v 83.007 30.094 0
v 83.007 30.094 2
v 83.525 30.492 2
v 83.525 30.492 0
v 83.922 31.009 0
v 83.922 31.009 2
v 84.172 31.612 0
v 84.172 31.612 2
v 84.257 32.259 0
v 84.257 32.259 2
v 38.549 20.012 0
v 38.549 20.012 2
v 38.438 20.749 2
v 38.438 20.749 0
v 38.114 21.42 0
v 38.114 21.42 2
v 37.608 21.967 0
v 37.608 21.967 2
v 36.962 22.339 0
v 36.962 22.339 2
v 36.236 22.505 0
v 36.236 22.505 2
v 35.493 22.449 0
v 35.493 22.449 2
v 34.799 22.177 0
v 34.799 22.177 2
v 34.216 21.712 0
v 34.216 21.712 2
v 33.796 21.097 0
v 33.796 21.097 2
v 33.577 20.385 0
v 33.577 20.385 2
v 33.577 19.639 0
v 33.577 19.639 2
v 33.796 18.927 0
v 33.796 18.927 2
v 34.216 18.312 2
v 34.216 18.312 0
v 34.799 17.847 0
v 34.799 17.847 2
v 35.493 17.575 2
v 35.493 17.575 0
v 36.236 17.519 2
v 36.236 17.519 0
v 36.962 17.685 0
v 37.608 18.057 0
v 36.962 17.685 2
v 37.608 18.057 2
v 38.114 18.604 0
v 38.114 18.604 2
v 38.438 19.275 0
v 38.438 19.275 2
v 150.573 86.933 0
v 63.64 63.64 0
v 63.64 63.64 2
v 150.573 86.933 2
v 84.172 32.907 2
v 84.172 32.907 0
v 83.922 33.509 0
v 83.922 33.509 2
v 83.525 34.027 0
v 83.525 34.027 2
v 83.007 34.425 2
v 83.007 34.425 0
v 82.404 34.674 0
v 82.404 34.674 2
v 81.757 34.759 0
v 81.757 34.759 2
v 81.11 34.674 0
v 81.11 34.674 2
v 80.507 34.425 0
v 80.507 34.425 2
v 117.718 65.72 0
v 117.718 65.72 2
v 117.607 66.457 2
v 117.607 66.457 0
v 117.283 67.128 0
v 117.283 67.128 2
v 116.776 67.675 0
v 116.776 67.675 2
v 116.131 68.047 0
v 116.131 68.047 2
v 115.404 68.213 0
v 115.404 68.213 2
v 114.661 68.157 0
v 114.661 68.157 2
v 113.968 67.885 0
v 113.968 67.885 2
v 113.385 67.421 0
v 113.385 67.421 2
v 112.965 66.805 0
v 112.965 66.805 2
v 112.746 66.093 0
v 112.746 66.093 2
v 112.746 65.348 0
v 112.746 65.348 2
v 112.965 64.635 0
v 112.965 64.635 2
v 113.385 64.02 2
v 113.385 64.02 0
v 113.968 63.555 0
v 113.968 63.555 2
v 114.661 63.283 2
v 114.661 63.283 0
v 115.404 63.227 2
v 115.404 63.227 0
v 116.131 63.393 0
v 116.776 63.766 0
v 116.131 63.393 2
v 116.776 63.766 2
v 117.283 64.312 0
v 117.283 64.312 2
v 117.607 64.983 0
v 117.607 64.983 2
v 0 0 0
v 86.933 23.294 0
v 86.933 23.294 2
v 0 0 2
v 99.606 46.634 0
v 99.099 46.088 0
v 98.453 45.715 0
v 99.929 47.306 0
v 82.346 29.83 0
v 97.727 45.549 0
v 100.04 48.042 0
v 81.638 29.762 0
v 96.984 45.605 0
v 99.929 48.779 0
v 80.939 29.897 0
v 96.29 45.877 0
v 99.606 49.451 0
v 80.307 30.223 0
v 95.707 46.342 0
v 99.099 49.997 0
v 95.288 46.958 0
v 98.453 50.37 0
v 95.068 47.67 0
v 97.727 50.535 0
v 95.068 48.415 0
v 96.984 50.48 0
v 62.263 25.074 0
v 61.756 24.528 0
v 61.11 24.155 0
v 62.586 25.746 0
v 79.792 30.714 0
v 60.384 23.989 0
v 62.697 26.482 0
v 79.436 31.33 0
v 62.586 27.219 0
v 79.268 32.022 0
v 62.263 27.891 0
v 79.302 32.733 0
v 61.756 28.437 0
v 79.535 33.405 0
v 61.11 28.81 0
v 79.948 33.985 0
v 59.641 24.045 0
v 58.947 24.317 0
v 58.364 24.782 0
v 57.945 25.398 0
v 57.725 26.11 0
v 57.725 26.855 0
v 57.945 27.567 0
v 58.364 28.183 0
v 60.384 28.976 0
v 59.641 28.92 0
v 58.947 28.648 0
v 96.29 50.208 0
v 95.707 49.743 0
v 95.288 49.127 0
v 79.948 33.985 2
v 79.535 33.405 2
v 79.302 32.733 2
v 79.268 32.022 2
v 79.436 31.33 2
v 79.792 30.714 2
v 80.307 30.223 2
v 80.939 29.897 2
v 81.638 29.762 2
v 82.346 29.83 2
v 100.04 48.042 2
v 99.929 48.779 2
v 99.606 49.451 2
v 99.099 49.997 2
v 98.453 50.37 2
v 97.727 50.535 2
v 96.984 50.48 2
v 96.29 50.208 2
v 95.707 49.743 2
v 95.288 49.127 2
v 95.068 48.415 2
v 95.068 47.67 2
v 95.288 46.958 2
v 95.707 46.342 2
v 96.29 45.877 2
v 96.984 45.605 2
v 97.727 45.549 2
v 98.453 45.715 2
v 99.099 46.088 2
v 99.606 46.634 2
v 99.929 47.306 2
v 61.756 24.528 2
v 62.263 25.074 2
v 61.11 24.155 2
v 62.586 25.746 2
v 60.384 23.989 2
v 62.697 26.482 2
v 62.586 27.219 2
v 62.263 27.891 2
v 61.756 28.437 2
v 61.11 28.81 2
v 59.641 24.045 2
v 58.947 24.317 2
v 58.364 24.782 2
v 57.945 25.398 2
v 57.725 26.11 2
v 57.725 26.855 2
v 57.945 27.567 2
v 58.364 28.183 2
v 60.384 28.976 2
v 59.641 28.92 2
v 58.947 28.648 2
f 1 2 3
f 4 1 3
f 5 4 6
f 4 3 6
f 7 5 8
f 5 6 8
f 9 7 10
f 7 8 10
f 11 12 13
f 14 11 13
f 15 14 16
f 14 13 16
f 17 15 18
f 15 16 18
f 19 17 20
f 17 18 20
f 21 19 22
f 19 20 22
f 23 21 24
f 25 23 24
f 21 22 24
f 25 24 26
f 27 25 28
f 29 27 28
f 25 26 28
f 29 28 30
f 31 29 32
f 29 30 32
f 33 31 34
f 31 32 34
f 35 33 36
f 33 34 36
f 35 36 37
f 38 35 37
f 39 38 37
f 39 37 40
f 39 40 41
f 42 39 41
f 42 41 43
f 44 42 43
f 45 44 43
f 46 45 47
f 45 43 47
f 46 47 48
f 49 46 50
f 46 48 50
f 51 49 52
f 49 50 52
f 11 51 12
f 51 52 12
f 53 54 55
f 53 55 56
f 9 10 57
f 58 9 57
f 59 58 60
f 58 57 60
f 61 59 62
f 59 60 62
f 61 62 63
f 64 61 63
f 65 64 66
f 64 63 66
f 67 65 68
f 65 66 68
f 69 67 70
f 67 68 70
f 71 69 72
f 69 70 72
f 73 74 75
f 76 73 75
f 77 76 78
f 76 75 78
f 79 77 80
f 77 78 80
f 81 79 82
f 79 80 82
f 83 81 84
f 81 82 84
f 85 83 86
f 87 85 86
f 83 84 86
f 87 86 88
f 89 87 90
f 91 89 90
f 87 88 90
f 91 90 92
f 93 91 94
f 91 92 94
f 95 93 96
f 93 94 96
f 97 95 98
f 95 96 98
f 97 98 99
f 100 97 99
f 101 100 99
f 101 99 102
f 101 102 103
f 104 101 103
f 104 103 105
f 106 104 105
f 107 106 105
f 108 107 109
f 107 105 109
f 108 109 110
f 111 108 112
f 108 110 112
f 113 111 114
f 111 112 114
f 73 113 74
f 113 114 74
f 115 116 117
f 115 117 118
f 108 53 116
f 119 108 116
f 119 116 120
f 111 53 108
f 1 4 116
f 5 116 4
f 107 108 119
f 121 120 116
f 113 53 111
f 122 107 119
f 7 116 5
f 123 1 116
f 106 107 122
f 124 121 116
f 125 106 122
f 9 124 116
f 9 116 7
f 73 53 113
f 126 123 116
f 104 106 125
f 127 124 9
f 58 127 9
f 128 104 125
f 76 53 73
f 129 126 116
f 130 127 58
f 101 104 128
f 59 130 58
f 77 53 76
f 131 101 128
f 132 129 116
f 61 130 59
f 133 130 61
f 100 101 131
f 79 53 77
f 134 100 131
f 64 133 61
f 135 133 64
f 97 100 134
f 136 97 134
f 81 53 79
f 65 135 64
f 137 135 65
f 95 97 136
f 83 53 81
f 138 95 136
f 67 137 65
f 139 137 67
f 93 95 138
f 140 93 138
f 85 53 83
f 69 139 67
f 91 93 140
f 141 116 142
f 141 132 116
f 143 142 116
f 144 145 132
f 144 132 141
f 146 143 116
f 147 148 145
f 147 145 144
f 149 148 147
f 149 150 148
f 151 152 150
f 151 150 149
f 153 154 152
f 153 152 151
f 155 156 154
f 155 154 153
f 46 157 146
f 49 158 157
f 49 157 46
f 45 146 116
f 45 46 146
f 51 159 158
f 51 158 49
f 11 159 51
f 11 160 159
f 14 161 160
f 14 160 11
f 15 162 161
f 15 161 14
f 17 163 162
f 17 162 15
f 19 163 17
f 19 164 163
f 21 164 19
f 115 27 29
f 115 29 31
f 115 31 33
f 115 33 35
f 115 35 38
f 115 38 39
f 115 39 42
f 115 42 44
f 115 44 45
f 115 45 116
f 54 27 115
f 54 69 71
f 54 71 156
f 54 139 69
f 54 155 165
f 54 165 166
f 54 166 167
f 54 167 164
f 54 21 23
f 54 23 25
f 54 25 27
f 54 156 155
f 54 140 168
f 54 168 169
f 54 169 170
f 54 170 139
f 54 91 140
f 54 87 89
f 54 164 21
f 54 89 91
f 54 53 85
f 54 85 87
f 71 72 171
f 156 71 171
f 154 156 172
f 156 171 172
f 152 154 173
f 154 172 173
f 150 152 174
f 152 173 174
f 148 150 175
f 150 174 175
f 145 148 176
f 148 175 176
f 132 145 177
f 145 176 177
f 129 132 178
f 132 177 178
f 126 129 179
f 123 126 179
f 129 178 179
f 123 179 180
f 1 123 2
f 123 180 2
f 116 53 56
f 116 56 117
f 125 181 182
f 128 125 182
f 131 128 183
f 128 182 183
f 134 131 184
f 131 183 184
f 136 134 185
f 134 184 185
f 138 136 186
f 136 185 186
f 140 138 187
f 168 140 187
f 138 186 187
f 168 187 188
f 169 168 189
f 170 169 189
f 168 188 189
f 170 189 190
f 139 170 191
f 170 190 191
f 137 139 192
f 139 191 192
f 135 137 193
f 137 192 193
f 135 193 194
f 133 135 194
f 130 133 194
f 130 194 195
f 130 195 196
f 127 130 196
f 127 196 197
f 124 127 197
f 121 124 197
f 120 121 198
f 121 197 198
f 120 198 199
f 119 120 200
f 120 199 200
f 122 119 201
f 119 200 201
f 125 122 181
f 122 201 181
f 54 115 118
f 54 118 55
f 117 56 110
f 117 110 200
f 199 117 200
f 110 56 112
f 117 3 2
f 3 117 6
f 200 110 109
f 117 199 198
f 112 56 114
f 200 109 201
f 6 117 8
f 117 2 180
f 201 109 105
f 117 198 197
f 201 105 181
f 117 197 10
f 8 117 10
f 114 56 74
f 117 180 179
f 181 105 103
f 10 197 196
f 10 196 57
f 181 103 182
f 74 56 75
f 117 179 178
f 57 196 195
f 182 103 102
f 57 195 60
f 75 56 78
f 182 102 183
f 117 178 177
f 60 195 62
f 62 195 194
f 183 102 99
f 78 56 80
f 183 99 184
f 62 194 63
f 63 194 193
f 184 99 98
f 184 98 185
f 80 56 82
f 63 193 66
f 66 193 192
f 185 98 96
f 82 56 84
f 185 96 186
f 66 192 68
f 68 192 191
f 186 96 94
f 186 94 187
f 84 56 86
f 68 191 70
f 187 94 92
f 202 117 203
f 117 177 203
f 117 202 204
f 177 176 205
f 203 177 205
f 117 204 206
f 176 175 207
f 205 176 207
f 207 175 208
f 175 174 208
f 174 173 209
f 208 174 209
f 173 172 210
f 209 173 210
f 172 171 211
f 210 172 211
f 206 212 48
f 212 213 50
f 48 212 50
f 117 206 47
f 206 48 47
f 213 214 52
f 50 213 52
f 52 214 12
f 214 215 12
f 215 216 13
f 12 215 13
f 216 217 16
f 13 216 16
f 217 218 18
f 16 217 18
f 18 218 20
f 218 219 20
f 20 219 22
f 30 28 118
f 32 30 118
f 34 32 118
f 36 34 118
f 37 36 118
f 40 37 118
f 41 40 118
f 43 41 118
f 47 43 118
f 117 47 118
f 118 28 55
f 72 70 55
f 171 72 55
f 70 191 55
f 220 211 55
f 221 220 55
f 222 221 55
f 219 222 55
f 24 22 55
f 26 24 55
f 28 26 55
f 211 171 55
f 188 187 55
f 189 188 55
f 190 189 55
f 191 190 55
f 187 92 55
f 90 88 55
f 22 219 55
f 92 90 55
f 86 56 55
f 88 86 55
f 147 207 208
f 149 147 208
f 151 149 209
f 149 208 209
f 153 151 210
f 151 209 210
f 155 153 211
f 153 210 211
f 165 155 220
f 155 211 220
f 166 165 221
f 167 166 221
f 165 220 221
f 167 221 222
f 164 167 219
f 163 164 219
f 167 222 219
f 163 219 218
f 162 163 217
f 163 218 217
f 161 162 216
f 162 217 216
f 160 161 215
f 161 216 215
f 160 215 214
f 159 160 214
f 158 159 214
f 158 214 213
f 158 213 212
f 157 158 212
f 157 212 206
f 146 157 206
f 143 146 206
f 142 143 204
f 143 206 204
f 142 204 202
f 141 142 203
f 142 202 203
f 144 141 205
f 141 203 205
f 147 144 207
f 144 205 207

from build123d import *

# Parameters (mm, degrees)
BOSS_EXTRUDE2_DEPTH = 2
SKETCH7_R           = 2.5
CUT_EXTRUDE6_DEPTH  = 2
SKETCH8_R           = 2.5
CUT_EXTRUDE7_DEPTH  = 2
SKETCH9_R           = 2.5
CUT_EXTRUDE8_DEPTH  = 2
SKETCH10_R          = 2.5
CUT_EXTRUDE9_DEPTH  = 2
CUT_EXTRUDE10_DEPTH = 2


with BuildPart() as part:
    # Sketch1 → Boss-Extrude2 (new body)
    with BuildSketch(Plane.XY):
        Polygon((0, 0), (63.639610307, 63.639610307), (150.572934673, 86.933324366), (86.933324366, 23.293714059), align=None)
    extrude(amount=BOSS_EXTRUDE2_DEPTH)

    # Sketch7 → Cut-Extrude6 (cut)
    with BuildSketch(Plane.XY.offset(2)):
        with Locations((115.217595613, 65.72012093)):
            Circle(SKETCH7_R)
    extrude(amount=-CUT_EXTRUDE6_DEPTH, mode=Mode.SUBTRACT)

    # Sketch8 → Cut-Extrude7 (cut)
    with BuildSketch(Plane.XY.offset(2)):
        with Locations((97.539926084, 48.042451401)):
            Circle(SKETCH8_R)
    extrude(amount=-CUT_EXTRUDE7_DEPTH, mode=Mode.SUBTRACT)

    # Sketch9 → Cut-Extrude8 (cut)
    with BuildSketch(Plane.XY.offset(2)):
        with Locations((60.196988258, 26.482496195)):
            Circle(SKETCH9_R)
    extrude(amount=-CUT_EXTRUDE8_DEPTH, mode=Mode.SUBTRACT)

    # Sketch10 → Cut-Extrude9 (cut)
    with BuildSketch(Plane.XY.offset(2)):
        with Locations((36.048842601, 20.012020067)):
            Circle(SKETCH10_R)
    extrude(amount=-CUT_EXTRUDE9_DEPTH, mode=Mode.SUBTRACT)

    # Sketch11 → Cut-Extrude10 (cut)
    with BuildSketch(Plane.XY.offset(2)):
        with BuildLine():
            Line((81.756943464, 32.259468781), (80.506943464, 34.42453229))
            ThreePointArc((80.506943464, 34.42453229), (79.591879955, 31.009468781), (83.006943464, 30.094405271))
            Line((83.006943464, 30.094405271), (81.756943464, 32.259468781))
        make_face()
        with BuildLine():
            ThreePointArc((84.256943464, 32.259468781), (84.066642295, 33.216177362), (83.524710417, 34.027235734))
            Line((83.524710417, 34.027235734), (81.756943464, 32.259468781))
            Line((81.756943464, 32.259468781), (83.006943464, 30.094405271))
            ThreePointArc((83.006943464, 30.094405271), (83.922006973, 31.009468781), (84.256943464, 32.259468781))
        make_face()
        with BuildLine():
            Line((81.756943464, 32.259468781), (83.524710417, 34.027235734))
            ThreePointArc((83.524710417, 34.027235734), (82.083258945, 34.738080934), (80.506943464, 34.42453229))
            Line((80.506943464, 34.42453229), (81.756943464, 32.259468781))
        make_face()
    extrude(amount=-CUT_EXTRUDE10_DEPTH, mode=Mode.SUBTRACT)


solid = part.part
